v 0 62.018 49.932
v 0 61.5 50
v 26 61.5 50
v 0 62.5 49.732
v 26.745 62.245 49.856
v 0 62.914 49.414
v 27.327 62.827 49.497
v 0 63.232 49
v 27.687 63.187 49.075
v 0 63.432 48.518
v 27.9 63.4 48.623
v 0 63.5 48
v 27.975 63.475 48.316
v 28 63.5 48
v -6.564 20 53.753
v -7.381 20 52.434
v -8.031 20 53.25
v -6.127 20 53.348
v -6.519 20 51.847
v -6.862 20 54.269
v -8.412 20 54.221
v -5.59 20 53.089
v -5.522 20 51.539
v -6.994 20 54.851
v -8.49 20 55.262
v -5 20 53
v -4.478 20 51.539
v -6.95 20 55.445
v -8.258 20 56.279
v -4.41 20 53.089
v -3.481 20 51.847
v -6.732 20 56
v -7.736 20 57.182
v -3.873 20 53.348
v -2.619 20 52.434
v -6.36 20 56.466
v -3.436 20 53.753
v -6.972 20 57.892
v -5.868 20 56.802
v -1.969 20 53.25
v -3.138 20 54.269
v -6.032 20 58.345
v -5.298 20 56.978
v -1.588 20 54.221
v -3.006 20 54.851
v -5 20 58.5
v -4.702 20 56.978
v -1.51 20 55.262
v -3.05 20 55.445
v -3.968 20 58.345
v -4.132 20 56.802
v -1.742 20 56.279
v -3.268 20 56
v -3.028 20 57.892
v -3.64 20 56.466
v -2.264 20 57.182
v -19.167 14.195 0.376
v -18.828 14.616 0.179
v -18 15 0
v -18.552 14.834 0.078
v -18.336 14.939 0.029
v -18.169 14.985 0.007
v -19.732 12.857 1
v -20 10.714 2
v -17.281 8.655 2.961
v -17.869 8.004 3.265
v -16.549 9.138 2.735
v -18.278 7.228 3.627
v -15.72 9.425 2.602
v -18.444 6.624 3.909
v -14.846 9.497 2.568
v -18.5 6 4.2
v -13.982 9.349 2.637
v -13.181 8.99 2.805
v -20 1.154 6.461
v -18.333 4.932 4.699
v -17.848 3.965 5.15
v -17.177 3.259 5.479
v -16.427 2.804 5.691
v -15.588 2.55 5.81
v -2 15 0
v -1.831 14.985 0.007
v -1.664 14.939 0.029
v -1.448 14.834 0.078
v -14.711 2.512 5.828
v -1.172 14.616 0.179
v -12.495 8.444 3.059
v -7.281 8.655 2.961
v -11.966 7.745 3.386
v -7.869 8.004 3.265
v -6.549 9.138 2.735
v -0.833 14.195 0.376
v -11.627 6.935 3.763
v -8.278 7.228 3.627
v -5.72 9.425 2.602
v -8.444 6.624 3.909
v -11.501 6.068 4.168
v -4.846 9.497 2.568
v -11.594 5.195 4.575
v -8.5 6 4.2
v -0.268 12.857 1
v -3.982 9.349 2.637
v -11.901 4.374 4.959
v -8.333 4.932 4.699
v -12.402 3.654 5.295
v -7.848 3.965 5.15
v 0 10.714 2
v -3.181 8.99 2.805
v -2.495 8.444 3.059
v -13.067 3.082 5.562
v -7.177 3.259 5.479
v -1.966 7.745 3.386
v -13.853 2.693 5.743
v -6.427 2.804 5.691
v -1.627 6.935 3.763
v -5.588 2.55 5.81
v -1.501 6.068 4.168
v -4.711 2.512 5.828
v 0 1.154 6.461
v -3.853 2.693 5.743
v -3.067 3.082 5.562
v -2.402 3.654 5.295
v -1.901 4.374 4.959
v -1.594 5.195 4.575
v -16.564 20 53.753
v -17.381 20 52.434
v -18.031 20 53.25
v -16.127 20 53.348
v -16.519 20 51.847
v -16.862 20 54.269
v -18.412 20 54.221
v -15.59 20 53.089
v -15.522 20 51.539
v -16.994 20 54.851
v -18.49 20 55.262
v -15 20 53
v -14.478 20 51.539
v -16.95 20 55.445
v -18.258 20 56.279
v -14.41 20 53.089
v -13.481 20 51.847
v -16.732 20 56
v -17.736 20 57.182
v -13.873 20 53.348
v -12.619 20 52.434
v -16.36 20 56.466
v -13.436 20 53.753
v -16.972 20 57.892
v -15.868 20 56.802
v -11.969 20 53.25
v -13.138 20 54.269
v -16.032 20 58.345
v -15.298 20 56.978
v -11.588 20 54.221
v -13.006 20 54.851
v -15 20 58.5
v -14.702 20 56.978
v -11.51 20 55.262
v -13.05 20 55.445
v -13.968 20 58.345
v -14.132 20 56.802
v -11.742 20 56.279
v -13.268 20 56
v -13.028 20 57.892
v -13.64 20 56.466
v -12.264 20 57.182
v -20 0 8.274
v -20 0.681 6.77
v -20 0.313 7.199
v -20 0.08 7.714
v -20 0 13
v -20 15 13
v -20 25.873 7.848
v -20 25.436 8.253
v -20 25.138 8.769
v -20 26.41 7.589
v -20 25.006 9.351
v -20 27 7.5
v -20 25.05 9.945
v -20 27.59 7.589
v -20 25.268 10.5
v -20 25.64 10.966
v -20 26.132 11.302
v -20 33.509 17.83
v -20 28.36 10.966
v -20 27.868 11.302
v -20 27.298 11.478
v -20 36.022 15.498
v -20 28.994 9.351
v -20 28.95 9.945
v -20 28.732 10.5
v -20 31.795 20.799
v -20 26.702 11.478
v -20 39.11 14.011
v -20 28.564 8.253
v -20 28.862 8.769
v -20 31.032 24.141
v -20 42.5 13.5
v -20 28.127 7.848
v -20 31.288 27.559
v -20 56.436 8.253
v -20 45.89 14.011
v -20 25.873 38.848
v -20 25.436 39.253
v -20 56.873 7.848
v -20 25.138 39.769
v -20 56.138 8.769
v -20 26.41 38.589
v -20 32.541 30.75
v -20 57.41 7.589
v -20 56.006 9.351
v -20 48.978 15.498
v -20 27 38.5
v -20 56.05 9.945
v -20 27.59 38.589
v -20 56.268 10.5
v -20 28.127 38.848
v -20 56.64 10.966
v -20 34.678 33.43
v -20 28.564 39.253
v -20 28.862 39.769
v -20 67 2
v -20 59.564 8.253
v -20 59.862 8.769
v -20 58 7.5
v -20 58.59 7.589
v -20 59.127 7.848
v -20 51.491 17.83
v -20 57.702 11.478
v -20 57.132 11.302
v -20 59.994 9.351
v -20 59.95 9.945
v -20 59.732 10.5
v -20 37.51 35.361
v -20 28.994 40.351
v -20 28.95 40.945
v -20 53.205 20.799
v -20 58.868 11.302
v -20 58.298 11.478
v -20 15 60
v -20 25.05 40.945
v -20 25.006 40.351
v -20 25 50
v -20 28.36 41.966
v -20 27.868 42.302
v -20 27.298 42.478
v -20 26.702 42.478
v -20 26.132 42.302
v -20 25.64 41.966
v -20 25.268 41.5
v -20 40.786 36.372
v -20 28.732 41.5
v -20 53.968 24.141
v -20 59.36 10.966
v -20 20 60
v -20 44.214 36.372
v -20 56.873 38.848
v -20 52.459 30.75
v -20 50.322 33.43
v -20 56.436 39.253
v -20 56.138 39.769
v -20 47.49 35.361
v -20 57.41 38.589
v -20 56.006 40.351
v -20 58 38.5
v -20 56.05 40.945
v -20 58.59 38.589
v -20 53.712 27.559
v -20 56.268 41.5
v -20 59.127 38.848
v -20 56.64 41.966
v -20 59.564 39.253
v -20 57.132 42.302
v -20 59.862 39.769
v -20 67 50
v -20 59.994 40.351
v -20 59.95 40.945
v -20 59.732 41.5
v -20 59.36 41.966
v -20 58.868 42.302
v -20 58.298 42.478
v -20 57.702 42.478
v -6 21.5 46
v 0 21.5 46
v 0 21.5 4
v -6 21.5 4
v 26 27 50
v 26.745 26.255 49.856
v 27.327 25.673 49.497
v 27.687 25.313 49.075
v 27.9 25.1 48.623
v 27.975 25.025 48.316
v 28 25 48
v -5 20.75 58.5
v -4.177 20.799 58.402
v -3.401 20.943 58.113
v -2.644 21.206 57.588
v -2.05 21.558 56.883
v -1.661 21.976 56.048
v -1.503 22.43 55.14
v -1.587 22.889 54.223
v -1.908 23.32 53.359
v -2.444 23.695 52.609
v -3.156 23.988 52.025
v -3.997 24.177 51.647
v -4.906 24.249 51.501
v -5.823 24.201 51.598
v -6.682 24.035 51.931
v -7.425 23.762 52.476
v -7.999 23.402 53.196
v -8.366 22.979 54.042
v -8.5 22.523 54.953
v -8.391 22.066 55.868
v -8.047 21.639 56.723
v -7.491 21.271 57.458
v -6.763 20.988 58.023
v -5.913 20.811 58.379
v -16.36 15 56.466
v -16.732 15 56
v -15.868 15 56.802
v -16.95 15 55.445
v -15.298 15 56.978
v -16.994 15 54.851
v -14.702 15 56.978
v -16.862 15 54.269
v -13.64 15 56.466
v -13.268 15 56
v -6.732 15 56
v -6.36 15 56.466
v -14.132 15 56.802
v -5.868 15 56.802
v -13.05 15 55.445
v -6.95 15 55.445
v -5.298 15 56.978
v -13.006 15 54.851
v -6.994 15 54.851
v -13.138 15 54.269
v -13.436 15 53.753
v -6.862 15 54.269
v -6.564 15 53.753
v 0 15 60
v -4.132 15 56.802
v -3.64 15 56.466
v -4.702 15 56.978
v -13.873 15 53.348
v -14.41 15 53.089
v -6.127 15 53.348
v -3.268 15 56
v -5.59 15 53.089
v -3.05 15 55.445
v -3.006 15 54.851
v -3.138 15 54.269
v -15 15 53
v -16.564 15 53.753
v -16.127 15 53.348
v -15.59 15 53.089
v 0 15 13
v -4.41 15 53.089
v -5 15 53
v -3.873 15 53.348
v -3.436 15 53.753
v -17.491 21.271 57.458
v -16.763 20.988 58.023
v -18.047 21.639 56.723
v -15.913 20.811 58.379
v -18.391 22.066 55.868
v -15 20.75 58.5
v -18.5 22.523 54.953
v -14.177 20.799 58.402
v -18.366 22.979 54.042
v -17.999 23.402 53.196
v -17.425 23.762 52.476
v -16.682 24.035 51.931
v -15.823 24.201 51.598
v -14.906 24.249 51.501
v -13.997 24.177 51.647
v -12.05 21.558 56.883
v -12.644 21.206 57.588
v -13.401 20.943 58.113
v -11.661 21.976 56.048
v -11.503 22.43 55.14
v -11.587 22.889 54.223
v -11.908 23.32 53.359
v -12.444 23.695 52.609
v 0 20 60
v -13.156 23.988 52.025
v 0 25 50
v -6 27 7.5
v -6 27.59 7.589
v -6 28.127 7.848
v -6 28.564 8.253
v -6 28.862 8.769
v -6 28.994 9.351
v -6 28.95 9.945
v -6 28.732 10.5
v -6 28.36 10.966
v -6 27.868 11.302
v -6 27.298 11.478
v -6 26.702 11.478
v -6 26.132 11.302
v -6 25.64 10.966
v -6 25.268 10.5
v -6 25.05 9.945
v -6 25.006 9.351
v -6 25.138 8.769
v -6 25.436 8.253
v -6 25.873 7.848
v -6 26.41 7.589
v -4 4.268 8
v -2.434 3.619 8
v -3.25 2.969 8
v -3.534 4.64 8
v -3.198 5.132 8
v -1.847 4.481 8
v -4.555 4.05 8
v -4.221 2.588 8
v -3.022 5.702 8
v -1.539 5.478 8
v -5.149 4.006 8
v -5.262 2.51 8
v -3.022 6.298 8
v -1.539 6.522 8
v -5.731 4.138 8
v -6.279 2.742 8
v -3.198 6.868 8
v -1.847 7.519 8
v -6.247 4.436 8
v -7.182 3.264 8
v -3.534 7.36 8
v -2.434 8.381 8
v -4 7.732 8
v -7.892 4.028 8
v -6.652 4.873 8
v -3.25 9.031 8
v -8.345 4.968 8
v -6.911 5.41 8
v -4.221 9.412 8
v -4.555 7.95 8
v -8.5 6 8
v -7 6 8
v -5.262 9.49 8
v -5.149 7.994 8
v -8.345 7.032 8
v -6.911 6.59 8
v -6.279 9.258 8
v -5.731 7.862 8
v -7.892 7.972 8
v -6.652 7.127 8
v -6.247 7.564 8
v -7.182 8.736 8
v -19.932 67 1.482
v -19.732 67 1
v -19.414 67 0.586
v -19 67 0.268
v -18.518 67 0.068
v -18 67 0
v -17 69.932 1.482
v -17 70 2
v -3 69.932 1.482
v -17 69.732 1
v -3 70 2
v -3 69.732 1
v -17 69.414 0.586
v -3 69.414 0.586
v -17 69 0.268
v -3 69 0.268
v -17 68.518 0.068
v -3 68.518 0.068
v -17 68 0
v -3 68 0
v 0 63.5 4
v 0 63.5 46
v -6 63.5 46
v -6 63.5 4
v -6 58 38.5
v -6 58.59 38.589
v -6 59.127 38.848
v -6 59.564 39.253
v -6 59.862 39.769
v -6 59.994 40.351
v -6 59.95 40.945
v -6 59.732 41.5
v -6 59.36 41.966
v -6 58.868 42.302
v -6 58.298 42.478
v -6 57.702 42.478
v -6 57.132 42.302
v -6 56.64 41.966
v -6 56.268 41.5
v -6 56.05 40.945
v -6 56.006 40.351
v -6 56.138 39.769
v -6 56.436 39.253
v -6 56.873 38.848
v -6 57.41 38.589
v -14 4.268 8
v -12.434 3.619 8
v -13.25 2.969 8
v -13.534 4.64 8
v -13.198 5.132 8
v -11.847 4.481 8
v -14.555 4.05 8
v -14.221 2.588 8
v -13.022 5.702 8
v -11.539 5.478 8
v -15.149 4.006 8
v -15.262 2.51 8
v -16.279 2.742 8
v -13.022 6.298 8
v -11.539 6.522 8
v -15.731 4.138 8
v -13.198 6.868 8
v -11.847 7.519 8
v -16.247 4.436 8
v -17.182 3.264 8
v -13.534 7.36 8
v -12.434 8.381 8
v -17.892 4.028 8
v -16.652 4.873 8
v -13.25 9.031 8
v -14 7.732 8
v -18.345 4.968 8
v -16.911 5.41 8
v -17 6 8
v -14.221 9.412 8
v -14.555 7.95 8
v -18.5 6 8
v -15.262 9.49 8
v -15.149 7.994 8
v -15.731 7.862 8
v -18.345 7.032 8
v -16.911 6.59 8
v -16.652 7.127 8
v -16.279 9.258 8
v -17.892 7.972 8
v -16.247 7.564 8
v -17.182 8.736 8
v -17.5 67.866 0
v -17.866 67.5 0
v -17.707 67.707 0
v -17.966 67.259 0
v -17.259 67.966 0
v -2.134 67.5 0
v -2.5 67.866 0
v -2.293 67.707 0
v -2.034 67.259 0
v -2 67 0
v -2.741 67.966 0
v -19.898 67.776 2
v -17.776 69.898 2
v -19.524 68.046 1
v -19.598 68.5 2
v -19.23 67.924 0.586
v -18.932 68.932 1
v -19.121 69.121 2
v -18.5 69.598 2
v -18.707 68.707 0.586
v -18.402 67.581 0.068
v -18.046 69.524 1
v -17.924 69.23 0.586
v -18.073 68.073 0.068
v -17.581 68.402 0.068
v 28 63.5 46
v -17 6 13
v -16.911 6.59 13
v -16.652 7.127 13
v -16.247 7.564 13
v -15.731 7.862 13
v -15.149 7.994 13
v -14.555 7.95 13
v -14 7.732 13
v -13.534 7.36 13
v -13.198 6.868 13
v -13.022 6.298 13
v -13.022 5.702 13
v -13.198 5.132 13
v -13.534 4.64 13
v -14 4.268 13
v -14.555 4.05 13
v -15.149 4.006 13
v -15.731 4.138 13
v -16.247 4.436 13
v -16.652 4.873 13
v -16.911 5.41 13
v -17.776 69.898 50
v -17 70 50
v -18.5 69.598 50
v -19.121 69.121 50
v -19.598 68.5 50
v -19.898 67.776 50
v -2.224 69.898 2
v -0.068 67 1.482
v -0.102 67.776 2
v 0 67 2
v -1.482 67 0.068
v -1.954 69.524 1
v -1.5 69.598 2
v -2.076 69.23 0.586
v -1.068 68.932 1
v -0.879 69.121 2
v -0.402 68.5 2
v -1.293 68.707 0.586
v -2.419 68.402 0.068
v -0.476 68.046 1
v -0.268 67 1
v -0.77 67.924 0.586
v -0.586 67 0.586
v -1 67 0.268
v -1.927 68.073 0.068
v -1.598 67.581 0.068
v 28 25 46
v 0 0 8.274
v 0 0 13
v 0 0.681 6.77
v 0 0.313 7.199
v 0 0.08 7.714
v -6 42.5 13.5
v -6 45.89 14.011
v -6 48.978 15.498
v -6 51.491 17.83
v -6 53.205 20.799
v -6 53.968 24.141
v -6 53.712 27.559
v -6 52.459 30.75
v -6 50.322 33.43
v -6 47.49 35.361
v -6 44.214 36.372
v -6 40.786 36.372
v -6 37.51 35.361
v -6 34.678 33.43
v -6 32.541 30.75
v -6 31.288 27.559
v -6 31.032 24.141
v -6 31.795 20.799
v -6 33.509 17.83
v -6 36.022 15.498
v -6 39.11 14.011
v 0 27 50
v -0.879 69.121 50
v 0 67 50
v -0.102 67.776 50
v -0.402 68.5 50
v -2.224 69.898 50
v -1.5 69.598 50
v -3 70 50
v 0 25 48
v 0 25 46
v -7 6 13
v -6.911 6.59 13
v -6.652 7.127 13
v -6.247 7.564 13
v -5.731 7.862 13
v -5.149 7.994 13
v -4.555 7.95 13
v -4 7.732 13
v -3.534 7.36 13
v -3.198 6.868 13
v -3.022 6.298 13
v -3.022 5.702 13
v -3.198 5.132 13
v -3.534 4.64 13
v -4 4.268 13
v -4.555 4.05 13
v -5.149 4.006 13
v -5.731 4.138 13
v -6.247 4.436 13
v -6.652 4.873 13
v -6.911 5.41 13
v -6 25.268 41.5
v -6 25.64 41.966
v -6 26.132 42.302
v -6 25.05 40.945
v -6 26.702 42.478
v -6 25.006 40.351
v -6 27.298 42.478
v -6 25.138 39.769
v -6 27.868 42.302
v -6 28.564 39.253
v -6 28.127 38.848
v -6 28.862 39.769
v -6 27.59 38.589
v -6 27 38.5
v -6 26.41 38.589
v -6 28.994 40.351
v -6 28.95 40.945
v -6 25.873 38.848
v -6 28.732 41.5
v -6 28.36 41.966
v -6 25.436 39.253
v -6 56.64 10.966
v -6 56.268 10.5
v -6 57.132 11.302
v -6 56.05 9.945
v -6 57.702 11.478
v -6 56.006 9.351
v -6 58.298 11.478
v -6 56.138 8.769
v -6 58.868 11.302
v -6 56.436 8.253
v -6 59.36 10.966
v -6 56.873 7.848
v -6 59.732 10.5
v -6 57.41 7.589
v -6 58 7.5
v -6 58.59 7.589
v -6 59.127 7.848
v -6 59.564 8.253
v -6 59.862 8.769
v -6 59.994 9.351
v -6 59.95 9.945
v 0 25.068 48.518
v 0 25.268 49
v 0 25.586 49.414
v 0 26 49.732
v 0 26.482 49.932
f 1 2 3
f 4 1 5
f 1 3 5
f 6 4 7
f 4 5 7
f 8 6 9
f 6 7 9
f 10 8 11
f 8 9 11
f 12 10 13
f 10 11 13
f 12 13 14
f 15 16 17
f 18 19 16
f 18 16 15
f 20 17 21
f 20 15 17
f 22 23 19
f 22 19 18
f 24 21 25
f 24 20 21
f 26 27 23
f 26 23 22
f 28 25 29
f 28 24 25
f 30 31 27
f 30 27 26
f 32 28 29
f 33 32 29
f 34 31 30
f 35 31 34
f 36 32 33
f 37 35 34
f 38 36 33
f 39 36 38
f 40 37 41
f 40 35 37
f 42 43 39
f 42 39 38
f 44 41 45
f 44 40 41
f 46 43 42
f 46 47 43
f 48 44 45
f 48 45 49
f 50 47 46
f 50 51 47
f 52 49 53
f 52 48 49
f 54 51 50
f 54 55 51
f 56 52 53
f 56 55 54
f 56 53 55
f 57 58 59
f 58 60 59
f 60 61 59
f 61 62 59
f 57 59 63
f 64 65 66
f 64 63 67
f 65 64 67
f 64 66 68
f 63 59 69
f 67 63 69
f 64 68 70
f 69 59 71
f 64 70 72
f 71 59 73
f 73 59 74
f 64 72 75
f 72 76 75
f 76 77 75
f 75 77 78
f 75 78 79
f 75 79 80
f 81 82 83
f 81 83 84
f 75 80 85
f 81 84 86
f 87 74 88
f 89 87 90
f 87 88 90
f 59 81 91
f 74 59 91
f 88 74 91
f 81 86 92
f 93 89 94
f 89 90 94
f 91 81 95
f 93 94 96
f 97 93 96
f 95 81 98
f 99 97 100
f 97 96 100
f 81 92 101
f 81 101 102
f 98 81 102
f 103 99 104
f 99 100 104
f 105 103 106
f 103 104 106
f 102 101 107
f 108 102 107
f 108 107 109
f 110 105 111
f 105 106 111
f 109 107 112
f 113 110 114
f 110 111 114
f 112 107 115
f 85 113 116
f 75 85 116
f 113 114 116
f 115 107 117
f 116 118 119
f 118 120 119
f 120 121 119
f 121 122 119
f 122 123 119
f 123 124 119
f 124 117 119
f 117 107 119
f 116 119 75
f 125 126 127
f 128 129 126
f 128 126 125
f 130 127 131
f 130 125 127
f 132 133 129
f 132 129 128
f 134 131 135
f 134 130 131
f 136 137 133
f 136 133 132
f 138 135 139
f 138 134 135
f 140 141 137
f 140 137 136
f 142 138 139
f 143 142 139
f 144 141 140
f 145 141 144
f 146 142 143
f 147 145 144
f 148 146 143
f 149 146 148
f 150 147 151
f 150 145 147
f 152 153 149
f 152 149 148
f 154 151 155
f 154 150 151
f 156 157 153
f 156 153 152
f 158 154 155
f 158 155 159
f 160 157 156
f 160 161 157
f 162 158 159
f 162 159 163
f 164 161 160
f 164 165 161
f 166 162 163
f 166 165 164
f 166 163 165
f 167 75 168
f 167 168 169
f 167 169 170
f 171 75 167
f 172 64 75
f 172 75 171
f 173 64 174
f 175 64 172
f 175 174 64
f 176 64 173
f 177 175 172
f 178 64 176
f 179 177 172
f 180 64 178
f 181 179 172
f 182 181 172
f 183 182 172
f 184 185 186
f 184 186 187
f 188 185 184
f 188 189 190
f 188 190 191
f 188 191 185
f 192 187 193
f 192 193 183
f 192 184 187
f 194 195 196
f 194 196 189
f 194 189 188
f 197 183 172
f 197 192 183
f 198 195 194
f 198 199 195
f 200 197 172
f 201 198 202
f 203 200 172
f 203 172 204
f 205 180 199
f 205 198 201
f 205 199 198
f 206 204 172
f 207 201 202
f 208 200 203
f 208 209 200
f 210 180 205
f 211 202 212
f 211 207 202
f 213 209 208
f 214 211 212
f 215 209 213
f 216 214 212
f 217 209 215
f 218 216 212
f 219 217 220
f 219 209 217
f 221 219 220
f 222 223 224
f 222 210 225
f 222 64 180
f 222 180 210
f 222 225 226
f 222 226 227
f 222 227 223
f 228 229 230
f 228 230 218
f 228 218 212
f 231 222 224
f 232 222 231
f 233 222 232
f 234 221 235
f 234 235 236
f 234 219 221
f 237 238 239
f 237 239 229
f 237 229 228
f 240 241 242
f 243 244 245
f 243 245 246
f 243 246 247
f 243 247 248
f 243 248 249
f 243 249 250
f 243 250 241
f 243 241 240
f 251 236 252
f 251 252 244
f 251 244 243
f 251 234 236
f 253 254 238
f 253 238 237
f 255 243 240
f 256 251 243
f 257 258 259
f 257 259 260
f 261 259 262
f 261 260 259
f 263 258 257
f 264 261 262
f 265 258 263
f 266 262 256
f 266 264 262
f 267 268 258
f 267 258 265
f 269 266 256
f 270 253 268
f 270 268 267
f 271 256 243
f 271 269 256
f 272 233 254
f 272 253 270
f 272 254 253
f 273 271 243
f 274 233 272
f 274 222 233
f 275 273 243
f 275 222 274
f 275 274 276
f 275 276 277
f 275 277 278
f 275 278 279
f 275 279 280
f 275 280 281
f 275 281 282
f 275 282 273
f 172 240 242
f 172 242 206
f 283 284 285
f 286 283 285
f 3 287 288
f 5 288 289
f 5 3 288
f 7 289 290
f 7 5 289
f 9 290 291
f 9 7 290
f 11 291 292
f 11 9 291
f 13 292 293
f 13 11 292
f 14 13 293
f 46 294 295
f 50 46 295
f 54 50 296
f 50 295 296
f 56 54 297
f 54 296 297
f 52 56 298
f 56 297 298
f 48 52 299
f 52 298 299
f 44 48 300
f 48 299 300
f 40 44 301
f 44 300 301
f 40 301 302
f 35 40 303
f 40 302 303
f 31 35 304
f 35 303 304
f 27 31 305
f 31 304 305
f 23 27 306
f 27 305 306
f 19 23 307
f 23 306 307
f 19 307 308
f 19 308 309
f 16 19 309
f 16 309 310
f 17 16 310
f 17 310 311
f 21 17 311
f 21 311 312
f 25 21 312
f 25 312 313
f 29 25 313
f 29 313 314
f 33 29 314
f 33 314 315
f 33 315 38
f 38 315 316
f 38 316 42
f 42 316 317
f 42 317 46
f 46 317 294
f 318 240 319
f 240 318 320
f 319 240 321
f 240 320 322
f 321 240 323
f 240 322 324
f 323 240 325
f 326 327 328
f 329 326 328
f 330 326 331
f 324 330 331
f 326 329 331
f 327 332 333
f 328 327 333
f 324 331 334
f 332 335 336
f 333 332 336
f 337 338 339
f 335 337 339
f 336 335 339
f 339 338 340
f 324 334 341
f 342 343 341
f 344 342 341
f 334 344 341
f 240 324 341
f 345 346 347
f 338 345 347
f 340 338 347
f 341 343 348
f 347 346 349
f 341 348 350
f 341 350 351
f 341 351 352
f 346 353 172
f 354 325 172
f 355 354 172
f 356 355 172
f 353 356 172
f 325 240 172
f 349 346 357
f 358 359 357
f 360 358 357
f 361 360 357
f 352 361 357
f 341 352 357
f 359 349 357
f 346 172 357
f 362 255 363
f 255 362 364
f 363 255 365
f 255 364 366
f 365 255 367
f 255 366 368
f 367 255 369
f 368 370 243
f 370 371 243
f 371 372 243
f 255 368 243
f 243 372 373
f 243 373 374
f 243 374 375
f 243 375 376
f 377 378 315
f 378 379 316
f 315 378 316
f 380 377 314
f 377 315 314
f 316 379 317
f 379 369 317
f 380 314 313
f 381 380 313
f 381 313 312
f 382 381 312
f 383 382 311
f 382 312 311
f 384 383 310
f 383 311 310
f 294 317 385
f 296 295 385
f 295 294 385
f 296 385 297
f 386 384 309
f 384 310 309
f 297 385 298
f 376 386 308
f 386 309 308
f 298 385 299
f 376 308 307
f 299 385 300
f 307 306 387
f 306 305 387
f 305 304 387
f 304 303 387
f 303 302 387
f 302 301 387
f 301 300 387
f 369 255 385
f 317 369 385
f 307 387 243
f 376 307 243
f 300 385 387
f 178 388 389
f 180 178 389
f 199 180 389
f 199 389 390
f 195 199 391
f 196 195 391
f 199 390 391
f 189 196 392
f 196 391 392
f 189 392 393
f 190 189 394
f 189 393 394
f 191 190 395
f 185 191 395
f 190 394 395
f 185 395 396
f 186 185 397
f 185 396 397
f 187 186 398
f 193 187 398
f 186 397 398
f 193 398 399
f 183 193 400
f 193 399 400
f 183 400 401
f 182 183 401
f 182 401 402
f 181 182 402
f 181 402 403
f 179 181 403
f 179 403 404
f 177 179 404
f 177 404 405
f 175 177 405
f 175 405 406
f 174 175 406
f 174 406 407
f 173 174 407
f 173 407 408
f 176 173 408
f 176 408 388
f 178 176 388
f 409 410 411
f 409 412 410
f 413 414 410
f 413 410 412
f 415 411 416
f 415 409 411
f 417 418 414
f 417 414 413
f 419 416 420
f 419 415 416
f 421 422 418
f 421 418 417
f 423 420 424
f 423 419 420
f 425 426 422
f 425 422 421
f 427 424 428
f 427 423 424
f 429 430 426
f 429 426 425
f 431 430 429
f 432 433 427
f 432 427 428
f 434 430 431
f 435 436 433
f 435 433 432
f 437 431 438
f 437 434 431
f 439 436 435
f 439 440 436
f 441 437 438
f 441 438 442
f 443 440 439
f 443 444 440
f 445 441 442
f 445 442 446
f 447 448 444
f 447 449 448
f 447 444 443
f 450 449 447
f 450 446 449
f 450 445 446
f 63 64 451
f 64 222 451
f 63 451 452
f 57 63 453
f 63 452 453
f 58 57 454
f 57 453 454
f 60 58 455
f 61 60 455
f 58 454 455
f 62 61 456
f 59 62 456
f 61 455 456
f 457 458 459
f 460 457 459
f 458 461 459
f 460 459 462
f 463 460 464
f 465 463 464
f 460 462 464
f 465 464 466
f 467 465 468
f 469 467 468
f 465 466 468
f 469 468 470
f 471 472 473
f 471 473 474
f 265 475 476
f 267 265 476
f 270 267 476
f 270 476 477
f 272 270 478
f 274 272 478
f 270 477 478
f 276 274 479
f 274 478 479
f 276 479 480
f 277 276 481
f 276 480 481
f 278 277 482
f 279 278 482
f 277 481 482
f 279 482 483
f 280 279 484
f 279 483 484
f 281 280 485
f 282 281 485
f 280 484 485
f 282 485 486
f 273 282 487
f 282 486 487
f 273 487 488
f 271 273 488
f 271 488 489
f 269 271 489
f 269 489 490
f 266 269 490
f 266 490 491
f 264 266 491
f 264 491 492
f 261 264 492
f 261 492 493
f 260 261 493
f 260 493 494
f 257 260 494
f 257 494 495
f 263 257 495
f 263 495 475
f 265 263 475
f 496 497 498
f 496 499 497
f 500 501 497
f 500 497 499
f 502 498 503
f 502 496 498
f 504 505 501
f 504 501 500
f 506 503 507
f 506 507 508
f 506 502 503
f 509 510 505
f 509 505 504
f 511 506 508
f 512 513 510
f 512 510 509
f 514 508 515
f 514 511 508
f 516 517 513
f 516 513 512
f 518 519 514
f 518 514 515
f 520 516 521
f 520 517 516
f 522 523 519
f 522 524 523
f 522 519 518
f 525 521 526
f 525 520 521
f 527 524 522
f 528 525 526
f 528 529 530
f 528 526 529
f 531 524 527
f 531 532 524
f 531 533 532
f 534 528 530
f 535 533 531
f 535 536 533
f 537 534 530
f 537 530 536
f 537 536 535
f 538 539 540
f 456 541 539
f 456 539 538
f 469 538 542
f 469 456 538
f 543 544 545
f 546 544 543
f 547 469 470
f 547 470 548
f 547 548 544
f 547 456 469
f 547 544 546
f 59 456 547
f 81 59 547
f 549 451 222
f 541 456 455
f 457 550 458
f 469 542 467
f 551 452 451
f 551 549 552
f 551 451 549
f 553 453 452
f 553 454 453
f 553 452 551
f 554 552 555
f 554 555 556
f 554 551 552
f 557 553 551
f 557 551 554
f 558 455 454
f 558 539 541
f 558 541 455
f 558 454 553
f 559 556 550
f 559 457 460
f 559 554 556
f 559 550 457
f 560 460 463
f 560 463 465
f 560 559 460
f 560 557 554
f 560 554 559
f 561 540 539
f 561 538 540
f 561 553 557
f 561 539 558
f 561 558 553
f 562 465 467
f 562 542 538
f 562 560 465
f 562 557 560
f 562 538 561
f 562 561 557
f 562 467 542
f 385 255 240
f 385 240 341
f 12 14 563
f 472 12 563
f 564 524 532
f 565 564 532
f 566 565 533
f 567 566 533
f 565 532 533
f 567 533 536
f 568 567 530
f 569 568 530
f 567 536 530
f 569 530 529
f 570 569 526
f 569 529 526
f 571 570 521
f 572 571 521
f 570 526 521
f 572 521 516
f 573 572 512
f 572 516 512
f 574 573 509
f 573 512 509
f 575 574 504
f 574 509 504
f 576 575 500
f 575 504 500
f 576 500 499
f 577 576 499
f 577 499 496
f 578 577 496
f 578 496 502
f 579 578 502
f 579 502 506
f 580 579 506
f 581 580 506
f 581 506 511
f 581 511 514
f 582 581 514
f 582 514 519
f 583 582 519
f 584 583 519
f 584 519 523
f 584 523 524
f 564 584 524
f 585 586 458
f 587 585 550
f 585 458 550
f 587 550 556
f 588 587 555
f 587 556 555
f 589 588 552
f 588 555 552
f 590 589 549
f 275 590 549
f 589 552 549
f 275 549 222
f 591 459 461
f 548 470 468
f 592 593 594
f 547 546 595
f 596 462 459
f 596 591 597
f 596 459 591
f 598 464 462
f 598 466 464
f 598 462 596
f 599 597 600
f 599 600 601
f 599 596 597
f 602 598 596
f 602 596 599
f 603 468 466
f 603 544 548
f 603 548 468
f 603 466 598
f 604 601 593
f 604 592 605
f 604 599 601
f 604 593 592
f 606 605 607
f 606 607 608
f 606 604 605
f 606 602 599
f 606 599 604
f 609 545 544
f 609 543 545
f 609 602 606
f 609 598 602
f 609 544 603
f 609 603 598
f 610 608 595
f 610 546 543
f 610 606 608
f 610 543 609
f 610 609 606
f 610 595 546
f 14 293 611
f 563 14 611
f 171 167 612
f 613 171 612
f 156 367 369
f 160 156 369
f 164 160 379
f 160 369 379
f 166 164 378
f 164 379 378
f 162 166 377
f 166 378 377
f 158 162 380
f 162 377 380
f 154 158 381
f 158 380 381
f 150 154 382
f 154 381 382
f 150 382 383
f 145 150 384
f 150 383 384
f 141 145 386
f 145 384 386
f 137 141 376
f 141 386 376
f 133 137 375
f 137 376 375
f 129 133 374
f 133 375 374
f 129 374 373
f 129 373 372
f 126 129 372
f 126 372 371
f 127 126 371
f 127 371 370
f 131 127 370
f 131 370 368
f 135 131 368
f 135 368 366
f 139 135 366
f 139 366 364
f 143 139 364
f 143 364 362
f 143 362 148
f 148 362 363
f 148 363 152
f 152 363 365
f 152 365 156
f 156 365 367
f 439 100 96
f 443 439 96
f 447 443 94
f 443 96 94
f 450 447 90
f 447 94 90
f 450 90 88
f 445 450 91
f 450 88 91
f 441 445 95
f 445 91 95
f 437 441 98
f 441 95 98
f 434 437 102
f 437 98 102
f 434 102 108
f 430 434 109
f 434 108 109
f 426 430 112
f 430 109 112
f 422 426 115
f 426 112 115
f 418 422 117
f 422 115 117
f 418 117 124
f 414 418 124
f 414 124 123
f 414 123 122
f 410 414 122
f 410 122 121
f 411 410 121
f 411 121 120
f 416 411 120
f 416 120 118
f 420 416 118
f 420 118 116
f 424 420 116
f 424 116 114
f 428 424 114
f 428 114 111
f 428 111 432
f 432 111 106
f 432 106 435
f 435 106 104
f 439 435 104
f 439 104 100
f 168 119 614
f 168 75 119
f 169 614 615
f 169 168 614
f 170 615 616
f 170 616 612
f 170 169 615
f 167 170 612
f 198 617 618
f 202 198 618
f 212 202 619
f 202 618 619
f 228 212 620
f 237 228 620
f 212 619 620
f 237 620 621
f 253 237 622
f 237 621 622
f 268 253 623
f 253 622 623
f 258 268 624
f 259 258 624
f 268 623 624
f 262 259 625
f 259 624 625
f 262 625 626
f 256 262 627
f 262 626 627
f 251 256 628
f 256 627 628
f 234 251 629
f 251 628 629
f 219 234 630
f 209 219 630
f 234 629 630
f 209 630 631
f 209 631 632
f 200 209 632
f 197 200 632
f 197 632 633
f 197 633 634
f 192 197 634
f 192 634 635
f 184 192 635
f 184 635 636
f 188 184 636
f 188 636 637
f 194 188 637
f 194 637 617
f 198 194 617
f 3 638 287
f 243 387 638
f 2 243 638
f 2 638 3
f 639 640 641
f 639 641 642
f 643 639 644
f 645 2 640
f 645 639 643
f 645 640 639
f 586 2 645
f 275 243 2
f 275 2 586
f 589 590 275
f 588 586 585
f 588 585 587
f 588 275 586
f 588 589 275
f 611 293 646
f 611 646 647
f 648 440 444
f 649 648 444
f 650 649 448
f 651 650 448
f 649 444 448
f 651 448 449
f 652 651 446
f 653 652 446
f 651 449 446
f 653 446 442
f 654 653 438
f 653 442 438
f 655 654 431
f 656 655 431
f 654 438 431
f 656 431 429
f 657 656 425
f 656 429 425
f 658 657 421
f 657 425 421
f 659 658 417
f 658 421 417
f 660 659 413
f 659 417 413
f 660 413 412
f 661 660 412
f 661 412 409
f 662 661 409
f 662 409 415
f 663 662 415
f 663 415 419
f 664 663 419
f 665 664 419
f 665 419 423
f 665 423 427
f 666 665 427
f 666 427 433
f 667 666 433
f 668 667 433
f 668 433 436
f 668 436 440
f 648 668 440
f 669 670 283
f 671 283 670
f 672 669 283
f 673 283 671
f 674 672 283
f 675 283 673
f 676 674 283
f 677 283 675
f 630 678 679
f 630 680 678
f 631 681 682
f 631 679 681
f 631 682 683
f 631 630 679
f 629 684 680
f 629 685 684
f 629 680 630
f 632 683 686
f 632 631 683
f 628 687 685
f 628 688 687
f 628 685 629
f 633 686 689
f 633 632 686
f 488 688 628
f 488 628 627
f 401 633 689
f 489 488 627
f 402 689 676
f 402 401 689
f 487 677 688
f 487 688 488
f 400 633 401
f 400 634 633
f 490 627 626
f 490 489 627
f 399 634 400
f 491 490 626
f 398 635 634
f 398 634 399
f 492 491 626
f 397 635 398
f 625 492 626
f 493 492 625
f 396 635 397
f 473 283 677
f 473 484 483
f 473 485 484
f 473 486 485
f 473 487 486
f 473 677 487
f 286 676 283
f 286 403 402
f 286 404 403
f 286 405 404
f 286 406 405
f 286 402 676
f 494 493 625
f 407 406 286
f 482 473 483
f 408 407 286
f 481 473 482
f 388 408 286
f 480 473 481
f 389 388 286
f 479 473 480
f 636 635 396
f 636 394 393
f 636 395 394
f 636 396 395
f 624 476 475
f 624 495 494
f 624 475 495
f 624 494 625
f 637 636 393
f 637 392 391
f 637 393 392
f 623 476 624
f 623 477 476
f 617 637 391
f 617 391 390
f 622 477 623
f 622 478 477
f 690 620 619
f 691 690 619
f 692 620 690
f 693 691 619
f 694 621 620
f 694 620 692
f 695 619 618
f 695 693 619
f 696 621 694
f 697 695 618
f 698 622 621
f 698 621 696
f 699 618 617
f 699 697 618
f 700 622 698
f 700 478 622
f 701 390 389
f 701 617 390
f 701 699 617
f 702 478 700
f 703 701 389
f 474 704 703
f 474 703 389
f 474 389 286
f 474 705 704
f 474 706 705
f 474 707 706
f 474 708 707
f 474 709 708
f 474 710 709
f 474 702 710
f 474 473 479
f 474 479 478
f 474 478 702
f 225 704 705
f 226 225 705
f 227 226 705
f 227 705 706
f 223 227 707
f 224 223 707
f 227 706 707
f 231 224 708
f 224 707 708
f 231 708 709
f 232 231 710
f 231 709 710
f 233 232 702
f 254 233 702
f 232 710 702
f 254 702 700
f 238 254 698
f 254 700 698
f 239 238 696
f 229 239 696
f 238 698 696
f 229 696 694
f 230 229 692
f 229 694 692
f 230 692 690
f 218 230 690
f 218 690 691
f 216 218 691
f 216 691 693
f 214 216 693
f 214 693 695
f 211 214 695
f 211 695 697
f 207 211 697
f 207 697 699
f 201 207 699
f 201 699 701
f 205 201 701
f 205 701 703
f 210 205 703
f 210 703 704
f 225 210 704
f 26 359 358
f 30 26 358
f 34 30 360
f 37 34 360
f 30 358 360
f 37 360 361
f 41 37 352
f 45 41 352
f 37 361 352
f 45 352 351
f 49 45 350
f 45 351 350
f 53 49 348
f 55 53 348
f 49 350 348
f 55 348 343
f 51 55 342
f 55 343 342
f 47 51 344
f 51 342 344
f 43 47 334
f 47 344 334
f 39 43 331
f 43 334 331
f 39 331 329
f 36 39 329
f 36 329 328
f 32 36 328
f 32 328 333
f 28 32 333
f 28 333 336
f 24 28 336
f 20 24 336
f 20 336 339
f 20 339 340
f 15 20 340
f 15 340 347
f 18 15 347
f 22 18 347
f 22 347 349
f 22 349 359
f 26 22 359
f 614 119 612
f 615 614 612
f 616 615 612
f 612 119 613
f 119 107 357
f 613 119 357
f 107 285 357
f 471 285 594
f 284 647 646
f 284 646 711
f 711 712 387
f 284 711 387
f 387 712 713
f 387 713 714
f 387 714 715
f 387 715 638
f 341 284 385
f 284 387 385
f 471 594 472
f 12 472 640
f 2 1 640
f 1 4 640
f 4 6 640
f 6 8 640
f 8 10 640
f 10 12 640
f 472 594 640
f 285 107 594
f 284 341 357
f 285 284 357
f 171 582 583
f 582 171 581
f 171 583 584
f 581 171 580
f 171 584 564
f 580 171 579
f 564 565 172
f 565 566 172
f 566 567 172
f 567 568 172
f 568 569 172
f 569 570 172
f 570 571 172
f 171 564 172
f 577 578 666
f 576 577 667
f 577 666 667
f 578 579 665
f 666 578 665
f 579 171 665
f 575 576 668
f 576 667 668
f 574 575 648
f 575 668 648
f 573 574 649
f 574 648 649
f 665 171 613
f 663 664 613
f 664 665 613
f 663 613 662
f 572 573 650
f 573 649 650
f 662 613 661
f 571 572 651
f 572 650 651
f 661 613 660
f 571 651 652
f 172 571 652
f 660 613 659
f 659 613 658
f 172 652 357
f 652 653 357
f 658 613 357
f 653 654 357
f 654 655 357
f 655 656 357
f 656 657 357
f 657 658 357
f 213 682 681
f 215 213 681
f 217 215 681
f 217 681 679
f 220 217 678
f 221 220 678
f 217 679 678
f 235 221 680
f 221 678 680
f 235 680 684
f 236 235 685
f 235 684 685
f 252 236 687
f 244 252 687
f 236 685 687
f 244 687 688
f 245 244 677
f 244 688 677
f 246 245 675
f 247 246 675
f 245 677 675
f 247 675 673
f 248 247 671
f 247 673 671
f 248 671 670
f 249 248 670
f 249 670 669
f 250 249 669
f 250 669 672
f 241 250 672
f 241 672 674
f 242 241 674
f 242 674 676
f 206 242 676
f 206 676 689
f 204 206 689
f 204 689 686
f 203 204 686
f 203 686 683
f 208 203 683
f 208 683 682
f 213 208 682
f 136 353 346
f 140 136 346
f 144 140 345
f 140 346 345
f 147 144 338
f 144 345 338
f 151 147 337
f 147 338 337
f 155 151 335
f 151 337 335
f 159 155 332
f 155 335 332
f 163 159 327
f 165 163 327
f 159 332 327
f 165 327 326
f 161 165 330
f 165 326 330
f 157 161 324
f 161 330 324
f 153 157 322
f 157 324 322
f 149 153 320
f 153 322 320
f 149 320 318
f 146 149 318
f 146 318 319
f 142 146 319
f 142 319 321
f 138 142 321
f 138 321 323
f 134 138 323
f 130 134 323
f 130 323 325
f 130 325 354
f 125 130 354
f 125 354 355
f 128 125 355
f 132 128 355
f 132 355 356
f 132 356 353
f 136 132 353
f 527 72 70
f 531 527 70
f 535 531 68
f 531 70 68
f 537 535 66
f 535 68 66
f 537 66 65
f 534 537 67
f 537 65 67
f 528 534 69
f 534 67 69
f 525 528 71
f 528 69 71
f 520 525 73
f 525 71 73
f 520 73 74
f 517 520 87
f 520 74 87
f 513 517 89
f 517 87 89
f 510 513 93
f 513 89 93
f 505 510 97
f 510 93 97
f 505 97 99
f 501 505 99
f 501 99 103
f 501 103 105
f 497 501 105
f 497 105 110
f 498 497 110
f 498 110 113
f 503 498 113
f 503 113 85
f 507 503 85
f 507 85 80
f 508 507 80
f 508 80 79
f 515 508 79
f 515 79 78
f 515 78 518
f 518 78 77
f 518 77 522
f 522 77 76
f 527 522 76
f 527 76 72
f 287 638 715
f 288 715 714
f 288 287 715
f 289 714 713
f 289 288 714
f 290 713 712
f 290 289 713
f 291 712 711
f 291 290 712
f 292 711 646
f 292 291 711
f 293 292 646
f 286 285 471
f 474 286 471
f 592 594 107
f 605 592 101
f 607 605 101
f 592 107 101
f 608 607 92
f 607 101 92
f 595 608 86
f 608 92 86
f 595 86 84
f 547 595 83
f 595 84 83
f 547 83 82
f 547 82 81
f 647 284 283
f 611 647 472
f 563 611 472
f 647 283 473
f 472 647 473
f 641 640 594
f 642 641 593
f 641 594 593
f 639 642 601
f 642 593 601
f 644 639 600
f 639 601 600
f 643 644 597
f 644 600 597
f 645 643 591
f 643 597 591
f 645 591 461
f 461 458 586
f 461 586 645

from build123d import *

# Parameters (mm, degrees)
SKETCH1_W           = 20
SKETCH1_H           = 50
BOSS_EXTRUDE1_DEPTH = 70
SKETCH2_R           = 2
SKETCH2_R_2         = 11.5
CUT_EXTRUDE2_DEPTH  = 60
SKETCH4_W           = 37
SKETCH4_H           = 15
CUT_EXTRUDE3_DEPTH  = 60
SKETCH8_R           = 2
CUT_EXTRUDE5_DEPTH  = 15
SKETCH9_W           = 42
SKETCH9_H           = 42
CUT_EXTRUDE6_DEPTH  = 6
CUT_EXTRUDE8_DEPTH  = 30
SKETCH12_W          = 20
SKETCH12_H          = 5
BOSS_EXTRUDE2_DEPTH = 10
BOSS_EXTRUDE3_DEPTH = 20
SKETCH15_R          = 2
CUT_EXTRUDE9_DEPTH  = 10
SKETCH17_R          = 3.5
CUT_EXTRUDE11_DEPTH = 8
SKETCH18_R          = 3.5
CUT_EXTRUDE12_DEPTH = 50
FILLET2_R           = 3
FILLET3_R           = 3
FILLET5_R           = 2
FILLET6_R           = 2
SKETCH19_W          = 4
SKETCH19_H          = 38.5
BOSS_EXTRUDE4_DEPTH = 28
FILLET7_R           = 2


with BuildPart() as part:
    # Sketch1 → Boss-Extrude1 (new body)
    with BuildSketch(Plane(origin=(0, 0, 0), x_dir=(1, 0, 0), z_dir=(0, 1, 0))):
        with Locations((-10, -25)):
            Rectangle(SKETCH1_W, SKETCH1_H)
    extrude(amount=BOSS_EXTRUDE1_DEPTH)

    # Sketch2 → Cut-Extrude2 (cut)
    with BuildSketch(Plane(origin=(0, 0, 0), x_dir=(0, 0, -1), z_dir=(1, 0, 0))):
        with Locations((-9.5, 58)):
            Circle(SKETCH2_R)
        with Locations((-25, 42.5)):
            Circle(SKETCH2_R_2)
        with Locations((-9.5, 27)):
            Circle(SKETCH2_R)
        with Locations((-40.5, 27)):
            Circle(SKETCH2_R)
        with Locations((-40.5, 58)):
            Circle(SKETCH2_R)
    extrude(amount=-CUT_EXTRUDE2_DEPTH, mode=Mode.SUBTRACT)

    # Sketch4 → Cut-Extrude3 (cut)
    with BuildSketch(Plane(origin=(0, 0, 0), x_dir=(0, 0, -1), z_dir=(1, 0, 0))):
        with Locations((-31.5, 7.5)):
            Rectangle(SKETCH4_W, SKETCH4_H)
    extrude(amount=-CUT_EXTRUDE3_DEPTH, mode=Mode.SUBTRACT)

    # Sketch8 → Cut-Extrude5 (cut)
    with BuildSketch(Plane(origin=(0, 0, 0), x_dir=(-1, 0, 0), z_dir=(0, 0, -1))):
        with Locations((15, 6)):
            Circle(SKETCH8_R)
        with Locations((5, 6)):
            Circle(SKETCH8_R)
    extrude(amount=-CUT_EXTRUDE5_DEPTH, mode=Mode.SUBTRACT)

    # Sketch9 → Cut-Extrude6 (cut)
    with BuildSketch(Plane(origin=(0, 0, 0), x_dir=(0, 0, -1), z_dir=(1, 0, 0))):
        with Locations((-25, 42.5)):
            Rectangle(SKETCH9_W, SKETCH9_H)
    extrude(amount=-CUT_EXTRUDE6_DEPTH, mode=Mode.SUBTRACT)

    # Sketch11 → Cut-Extrude8 (cut)
    with BuildSketch(Plane(origin=(0, 0, 0), x_dir=(0, 0, -1), z_dir=(1, 0, 0))):
        Polygon((-7, 0), (0, 0), (0, 15), align=None)
    extrude(amount=-CUT_EXTRUDE8_DEPTH, mode=Mode.SUBTRACT)

    # Sketch12 → Boss-Extrude2 (add)
    with BuildSketch(Plane.XY.offset(50)):
        with Locations((-10, 17.5)):
            Rectangle(SKETCH12_W, SKETCH12_H)
    extrude(amount=BOSS_EXTRUDE2_DEPTH)

    # Sketch14 → Boss-Extrude3 (add)
    with BuildSketch(Plane(origin=(0, 0, 0), x_dir=(0, 0, -1), z_dir=(1, 0, 0))):
        Polygon((-50, 20), (-60, 20), (-50, 25), align=None)
    extrude(amount=-BOSS_EXTRUDE3_DEPTH)

    # Sketch15 → Cut-Extrude9 (cut)
    with BuildSketch(Plane(origin=(0, 15, 0), x_dir=(-1, 0, 0), z_dir=(0, -1, 0))):
        with Locations(Location((5, -55, 0), (0, 0, 90))):
            Circle(SKETCH15_R)
        with Locations(Location((15, -55, 0), (0, 0, 90))):
            Circle(SKETCH15_R)
    extrude(amount=-CUT_EXTRUDE9_DEPTH, mode=Mode.SUBTRACT)

    # Sketch17 → Cut-Extrude11 (cut)
    with BuildSketch(Plane(origin=(0, 0, 0), x_dir=(-1, 0, 0), z_dir=(0, 0, -1))):
        with Locations((15, 6)):
            Circle(SKETCH17_R)
        with Locations((5, 6)):
            Circle(SKETCH17_R)
    extrude(amount=-CUT_EXTRUDE11_DEPTH, mode=Mode.SUBTRACT)

    # Sketch18 → Cut-Extrude12 (cut)
    with BuildSketch(Plane(origin=(0, 70, 0), x_dir=(1, 0, 0), z_dir=(0, 1, 0))):
        with Locations(Location((-15, -55, 0), (0, 0, 270))):
            Circle(SKETCH18_R)
        with Locations(Location((-5, -55, 0), (0, 0, 270))):
            Circle(SKETCH18_R)
    extrude(amount=-CUT_EXTRUDE12_DEPTH, mode=Mode.SUBTRACT)

    # Fillet2
    fillet2_edges = [part.edges().sort_by_distance(p)[0] for p in [
        (0, 70, 25),
    ]]
    fillet(fillet2_edges, radius=FILLET2_R)

    # Fillet3
    fillet3_edges = [part.edges().sort_by_distance(p)[0] for p in [
        (-20, 70, 25),
    ]]
    fillet(fillet3_edges, radius=FILLET3_R)

    # Fillet5
    fillet5_edges = [part.edges().sort_by_distance(p)[0] for p in [
        (-10, 70, 0),
        (0, 41, 0),
        (-0.878679656, 69.121320344, 0),
        (-20, 41, 0),
        (-19.121320344, 69.121320344, 0),
    ]]
    fillet(fillet5_edges, radius=FILLET5_R)

    # Fillet6
    fillet6_edges = [part.edges().sort_by_distance(p)[0] for p in [
        (-10, 0, 7),
    ]]
    fillet(fillet6_edges, radius=FILLET6_R)

    # Sketch19 → Boss-Extrude4 (add)
    with BuildSketch(Plane(origin=(0, 0, 0), x_dir=(0, 0, -1), z_dir=(1, 0, 0))):
        with Locations((-48, 44.25)):
            Rectangle(SKETCH19_W, SKETCH19_H)
    extrude(amount=BOSS_EXTRUDE4_DEPTH)

    # Fillet7
    fillet7_edges = [part.edges().sort_by_distance(p)[0] for p in [
        (14, 63.5, 50),
        (14, 25, 50),
        (28, 44.25, 50),
    ]]
    fillet(fillet7_edges, radius=FILLET7_R)


solid = part.part
